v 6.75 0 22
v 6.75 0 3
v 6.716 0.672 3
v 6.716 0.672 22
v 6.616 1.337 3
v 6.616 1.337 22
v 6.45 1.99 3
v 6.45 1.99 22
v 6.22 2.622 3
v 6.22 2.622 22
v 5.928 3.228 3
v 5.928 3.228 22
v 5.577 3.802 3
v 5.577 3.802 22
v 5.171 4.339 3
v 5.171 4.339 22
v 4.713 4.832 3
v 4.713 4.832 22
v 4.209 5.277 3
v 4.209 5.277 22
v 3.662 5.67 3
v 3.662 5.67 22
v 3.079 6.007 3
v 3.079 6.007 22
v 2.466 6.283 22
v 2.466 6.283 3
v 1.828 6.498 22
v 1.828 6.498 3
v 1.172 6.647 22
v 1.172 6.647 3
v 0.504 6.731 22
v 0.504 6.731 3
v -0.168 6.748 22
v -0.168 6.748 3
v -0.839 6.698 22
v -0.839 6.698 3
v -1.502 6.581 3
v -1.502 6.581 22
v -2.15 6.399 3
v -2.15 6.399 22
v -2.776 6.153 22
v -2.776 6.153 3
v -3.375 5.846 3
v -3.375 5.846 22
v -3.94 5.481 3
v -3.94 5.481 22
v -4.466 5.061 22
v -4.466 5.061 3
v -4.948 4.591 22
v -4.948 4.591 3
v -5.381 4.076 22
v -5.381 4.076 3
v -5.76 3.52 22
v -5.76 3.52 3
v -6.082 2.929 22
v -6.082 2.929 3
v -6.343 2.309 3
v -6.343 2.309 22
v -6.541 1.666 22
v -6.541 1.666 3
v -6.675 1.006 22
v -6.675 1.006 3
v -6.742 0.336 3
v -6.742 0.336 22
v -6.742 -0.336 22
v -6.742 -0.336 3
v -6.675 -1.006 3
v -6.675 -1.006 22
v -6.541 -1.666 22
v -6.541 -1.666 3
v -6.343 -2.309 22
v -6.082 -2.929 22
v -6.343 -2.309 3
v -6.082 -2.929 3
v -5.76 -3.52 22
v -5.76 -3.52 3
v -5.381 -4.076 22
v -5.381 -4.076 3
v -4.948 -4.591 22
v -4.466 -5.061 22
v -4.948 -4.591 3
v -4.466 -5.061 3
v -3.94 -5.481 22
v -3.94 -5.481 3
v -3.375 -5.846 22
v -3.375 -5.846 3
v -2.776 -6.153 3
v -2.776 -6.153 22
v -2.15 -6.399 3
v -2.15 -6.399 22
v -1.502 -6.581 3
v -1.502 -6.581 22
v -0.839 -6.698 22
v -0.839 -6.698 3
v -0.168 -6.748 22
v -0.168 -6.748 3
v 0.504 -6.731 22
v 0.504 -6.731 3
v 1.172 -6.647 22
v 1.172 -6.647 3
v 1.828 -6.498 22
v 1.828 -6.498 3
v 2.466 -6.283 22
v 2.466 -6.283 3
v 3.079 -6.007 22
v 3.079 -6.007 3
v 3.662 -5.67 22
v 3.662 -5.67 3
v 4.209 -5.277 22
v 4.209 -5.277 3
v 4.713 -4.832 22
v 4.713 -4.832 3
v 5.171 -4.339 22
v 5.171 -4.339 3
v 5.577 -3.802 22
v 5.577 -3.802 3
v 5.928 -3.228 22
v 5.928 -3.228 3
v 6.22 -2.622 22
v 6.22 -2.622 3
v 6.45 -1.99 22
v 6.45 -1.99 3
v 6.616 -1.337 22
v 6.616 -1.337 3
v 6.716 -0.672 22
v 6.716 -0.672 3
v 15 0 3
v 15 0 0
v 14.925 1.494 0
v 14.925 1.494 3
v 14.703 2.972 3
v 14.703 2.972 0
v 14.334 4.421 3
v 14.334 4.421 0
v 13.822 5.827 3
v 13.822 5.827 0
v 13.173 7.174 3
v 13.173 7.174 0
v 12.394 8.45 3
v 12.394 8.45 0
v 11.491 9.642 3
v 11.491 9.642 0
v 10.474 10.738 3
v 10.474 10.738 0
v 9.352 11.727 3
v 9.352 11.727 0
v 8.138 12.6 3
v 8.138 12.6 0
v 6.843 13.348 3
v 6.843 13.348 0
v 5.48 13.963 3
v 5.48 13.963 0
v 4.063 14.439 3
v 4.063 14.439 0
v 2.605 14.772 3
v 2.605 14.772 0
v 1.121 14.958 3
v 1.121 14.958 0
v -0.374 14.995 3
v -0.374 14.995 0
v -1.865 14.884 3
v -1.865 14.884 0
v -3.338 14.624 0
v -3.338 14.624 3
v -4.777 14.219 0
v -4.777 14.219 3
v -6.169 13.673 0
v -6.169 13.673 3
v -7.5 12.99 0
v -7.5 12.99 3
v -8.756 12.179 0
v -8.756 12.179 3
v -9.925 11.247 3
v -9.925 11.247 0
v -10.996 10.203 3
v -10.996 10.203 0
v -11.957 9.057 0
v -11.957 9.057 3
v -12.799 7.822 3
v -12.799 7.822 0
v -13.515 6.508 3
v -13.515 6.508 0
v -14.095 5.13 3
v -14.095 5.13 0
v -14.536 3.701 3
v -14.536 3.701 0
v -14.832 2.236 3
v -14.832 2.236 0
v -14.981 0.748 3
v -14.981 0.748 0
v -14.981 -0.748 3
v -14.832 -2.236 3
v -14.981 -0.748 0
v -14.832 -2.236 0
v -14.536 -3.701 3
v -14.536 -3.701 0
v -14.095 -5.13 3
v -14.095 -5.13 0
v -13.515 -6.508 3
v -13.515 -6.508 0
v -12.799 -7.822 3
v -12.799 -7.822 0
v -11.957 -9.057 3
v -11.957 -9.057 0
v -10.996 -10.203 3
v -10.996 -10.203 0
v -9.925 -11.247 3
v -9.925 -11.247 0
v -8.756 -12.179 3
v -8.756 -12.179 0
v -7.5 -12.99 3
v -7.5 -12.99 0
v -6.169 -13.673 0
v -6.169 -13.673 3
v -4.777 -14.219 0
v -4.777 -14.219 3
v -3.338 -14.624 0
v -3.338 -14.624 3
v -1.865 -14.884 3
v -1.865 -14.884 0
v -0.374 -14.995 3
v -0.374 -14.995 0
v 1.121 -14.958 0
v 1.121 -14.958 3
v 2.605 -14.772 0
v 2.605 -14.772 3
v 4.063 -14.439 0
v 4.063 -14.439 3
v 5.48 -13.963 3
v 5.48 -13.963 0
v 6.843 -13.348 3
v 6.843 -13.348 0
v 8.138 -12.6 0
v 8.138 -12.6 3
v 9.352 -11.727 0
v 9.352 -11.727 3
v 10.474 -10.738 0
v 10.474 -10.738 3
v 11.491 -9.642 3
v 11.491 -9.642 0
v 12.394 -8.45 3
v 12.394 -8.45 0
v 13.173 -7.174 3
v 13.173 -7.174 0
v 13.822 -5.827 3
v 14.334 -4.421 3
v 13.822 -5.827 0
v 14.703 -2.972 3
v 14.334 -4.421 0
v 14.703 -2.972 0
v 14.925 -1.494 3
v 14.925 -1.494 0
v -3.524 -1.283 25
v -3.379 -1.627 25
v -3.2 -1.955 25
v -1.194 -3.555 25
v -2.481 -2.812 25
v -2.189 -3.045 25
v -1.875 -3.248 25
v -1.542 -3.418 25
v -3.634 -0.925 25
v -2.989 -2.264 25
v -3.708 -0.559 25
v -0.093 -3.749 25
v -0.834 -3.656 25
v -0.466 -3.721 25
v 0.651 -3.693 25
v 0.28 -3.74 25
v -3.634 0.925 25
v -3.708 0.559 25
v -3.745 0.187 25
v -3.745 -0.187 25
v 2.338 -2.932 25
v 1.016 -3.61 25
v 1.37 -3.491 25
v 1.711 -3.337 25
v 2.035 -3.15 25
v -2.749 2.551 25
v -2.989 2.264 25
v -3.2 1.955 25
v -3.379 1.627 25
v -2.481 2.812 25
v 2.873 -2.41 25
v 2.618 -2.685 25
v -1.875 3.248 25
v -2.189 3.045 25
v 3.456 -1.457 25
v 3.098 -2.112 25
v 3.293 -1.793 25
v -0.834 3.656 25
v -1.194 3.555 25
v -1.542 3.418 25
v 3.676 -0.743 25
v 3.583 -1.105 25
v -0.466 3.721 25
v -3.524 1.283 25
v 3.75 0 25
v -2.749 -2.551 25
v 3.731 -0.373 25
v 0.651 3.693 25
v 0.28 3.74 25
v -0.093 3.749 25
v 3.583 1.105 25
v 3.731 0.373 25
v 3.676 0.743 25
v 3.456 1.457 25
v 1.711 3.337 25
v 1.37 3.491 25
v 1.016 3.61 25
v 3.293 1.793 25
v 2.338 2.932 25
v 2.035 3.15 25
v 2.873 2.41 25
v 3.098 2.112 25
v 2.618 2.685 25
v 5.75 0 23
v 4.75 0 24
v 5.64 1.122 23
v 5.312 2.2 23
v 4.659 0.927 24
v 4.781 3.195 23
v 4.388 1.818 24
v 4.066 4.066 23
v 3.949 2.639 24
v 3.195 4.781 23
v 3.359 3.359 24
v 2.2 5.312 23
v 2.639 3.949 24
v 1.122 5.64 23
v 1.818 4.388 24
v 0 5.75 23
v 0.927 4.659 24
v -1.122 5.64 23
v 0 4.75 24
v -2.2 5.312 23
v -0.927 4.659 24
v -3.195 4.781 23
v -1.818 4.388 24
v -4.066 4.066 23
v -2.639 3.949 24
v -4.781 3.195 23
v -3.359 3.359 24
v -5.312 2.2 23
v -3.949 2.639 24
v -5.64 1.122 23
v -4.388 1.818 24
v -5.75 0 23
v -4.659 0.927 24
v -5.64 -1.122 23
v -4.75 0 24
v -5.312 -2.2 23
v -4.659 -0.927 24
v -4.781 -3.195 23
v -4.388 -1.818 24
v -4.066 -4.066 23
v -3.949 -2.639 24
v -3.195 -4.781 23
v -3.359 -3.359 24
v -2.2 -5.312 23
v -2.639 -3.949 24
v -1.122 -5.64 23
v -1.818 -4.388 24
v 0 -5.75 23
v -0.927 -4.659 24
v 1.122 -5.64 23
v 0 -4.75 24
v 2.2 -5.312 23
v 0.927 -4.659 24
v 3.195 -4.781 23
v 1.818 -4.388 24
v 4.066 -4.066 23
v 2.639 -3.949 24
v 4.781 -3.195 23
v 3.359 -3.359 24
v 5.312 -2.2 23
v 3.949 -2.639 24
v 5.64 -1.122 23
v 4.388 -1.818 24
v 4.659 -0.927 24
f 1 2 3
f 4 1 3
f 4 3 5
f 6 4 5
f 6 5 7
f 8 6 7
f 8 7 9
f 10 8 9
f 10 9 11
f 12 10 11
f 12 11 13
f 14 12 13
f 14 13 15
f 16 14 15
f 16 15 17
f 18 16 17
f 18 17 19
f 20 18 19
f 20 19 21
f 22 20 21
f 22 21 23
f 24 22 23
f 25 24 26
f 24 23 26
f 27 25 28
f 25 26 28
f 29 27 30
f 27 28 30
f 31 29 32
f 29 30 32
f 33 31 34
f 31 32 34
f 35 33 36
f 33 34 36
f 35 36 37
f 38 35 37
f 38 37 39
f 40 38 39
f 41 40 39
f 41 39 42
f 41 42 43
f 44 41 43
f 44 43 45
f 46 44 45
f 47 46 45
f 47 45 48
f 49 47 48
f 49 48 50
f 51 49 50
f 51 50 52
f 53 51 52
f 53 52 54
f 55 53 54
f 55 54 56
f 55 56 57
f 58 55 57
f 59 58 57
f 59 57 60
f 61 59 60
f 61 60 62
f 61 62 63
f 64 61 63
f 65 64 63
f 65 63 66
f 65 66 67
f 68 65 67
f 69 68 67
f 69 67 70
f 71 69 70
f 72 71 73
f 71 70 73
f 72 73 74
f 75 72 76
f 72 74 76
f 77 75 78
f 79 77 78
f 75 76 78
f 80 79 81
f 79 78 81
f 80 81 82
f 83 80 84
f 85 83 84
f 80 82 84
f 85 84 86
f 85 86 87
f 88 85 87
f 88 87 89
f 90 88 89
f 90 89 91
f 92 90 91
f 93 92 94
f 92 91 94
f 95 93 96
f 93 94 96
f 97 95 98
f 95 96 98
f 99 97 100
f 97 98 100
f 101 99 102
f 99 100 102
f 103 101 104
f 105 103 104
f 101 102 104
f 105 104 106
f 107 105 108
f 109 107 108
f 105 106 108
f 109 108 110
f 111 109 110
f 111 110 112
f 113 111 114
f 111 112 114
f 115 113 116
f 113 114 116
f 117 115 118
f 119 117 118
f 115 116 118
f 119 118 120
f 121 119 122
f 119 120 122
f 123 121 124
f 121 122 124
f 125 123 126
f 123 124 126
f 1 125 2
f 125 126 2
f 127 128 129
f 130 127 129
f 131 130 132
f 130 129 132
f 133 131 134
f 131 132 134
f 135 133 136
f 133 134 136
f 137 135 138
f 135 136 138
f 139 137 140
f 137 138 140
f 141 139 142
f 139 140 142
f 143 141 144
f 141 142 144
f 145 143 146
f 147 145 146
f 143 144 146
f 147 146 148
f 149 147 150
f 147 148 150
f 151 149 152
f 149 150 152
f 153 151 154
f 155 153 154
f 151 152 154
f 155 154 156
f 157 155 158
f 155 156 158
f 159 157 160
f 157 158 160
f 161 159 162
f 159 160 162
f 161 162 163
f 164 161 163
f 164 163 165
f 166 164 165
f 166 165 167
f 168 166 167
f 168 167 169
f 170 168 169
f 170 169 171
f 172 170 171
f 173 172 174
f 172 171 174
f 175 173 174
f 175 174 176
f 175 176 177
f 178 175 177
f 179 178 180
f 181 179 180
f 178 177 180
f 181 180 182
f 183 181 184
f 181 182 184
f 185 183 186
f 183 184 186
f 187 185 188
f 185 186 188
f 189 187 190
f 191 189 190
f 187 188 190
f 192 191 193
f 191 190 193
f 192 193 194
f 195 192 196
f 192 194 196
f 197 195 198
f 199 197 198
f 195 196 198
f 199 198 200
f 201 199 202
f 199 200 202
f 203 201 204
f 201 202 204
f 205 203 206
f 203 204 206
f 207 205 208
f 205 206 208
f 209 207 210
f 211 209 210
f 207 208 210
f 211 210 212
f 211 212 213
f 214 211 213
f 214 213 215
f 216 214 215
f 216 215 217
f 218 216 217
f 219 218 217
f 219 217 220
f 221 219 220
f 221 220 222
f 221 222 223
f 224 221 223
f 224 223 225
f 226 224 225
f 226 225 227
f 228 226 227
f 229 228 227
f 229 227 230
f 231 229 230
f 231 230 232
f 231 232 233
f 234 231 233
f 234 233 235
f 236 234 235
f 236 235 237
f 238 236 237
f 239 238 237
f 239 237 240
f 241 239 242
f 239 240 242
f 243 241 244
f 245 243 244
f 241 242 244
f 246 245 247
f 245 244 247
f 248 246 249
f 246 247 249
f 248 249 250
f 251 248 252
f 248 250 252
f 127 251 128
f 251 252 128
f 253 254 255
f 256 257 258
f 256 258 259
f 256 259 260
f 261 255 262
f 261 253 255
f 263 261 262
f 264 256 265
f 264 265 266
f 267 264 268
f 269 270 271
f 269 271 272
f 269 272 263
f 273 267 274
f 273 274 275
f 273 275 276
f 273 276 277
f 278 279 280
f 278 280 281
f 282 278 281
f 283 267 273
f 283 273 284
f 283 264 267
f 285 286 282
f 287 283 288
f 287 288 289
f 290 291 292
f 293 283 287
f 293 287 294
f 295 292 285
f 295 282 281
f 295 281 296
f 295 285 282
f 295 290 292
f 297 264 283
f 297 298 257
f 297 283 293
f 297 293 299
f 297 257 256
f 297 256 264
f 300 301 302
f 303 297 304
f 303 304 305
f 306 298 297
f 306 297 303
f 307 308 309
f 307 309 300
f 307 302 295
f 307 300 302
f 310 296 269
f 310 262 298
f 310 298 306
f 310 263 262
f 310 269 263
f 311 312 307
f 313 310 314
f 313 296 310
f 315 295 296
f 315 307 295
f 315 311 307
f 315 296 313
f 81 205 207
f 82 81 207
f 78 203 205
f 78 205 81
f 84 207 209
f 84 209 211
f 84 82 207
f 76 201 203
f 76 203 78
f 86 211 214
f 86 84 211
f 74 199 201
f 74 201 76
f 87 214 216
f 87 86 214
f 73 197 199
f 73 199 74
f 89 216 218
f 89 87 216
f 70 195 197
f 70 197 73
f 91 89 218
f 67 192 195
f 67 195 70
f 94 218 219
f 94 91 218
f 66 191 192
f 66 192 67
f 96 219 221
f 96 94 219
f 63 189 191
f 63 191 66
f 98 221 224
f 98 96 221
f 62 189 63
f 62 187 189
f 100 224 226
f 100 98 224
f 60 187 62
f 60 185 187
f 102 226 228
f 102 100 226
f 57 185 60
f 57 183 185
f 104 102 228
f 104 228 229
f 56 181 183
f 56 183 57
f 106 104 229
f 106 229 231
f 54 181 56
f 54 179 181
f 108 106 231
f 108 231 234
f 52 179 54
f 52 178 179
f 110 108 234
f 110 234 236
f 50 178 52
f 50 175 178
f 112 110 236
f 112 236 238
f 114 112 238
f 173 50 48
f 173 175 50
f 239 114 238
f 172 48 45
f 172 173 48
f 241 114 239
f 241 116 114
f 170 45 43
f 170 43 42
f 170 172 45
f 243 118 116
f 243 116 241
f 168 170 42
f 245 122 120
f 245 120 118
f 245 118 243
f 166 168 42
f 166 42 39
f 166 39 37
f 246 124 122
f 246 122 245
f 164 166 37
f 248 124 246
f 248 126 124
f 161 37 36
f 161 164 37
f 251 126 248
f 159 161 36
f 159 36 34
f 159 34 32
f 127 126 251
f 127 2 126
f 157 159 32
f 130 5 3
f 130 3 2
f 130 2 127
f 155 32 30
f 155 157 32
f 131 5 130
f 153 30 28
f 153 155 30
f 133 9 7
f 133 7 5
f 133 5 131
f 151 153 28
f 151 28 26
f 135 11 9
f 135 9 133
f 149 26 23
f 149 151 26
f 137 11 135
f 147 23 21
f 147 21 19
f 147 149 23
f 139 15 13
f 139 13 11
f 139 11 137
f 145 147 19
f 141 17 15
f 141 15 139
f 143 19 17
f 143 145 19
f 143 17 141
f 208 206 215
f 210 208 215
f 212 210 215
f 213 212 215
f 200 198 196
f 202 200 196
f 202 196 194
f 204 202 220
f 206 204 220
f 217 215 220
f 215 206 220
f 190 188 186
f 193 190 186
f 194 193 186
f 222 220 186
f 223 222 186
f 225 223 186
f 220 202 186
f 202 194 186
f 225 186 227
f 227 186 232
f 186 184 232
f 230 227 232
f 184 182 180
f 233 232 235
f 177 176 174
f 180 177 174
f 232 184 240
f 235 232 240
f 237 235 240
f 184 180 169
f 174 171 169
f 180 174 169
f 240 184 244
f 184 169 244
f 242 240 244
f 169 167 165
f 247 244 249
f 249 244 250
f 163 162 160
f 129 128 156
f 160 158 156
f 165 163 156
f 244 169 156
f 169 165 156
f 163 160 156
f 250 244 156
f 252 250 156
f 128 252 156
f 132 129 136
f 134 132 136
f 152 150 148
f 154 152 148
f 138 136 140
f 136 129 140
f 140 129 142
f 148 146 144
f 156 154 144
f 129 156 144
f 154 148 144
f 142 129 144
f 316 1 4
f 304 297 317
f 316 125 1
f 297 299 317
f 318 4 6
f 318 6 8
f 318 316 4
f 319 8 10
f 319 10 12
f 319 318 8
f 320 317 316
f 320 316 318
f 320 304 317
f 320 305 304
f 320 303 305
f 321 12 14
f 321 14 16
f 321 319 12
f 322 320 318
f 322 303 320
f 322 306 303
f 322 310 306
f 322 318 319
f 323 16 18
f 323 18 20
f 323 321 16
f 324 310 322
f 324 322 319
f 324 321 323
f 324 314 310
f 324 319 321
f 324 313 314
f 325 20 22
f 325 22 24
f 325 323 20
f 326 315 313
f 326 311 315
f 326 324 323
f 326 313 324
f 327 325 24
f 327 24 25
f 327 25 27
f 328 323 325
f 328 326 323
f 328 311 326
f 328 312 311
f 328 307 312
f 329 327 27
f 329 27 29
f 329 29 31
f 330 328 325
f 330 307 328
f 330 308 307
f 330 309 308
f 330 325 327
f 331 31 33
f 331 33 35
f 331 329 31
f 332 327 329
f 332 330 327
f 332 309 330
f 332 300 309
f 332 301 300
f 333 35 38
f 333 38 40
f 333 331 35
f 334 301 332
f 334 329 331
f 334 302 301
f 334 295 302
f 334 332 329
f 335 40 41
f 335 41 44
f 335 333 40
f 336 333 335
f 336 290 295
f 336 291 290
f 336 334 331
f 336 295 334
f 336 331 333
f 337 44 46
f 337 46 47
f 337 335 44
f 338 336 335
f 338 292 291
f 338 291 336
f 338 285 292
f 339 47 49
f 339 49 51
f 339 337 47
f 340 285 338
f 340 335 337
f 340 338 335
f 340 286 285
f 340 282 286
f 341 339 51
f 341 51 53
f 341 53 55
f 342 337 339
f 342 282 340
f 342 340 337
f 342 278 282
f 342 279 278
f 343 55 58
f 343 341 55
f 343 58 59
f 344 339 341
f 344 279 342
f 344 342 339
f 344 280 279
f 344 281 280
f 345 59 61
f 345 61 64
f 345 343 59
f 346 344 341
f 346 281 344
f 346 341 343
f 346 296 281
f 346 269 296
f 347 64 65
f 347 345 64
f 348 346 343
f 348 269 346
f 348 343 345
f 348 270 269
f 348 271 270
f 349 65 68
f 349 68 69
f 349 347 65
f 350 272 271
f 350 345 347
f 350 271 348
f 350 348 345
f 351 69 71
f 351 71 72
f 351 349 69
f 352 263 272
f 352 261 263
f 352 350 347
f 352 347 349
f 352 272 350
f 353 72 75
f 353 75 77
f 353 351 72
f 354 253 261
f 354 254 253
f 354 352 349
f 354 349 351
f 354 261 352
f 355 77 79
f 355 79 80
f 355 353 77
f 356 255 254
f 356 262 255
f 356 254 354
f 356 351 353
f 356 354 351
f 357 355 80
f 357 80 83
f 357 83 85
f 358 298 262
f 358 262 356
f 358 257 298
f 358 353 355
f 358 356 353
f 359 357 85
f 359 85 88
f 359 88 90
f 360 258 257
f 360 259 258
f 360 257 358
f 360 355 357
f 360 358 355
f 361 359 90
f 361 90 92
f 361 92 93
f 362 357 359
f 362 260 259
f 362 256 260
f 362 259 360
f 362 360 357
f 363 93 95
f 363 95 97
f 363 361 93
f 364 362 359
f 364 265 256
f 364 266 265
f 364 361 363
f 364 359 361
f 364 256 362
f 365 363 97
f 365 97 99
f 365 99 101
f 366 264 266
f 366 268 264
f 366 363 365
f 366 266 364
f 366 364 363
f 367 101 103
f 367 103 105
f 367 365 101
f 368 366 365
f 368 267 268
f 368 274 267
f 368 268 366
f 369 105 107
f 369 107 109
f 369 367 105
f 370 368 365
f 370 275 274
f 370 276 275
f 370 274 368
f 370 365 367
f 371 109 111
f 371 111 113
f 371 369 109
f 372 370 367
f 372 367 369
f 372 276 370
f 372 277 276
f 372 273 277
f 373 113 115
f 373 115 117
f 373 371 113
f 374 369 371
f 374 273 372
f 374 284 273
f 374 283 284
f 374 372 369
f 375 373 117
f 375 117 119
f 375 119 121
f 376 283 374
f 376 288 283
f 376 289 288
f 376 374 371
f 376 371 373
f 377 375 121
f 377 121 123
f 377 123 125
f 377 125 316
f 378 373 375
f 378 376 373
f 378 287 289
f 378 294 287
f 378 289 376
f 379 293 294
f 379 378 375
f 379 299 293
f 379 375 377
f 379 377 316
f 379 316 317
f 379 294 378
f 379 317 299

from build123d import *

# Parameters (mm, degrees)
SKETCH_R     = 6.75
PAD_DEPTH    = 25
SKETCH001_R  = 15
PAD001_DEPTH = 3
CHAMFER_SIZE = 3


with BuildPart() as part:
    # Sketch → Pad (new body)
    with BuildSketch(Plane.XY):
        Circle(SKETCH_R)
    extrude(amount=PAD_DEPTH)

    # Sketch001 → Pad001 (join)
    with BuildSketch(Plane.XY):
        Circle(SKETCH001_R)
    extrude(amount=PAD001_DEPTH)

    # Chamfer
    chamfer_edges = [part.edges().sort_by_distance(p)[0] for p in [
        (-6.75, 0, 25),
    ]]
    chamfer(chamfer_edges, length=CHAMFER_SIZE)


solid = part.part
